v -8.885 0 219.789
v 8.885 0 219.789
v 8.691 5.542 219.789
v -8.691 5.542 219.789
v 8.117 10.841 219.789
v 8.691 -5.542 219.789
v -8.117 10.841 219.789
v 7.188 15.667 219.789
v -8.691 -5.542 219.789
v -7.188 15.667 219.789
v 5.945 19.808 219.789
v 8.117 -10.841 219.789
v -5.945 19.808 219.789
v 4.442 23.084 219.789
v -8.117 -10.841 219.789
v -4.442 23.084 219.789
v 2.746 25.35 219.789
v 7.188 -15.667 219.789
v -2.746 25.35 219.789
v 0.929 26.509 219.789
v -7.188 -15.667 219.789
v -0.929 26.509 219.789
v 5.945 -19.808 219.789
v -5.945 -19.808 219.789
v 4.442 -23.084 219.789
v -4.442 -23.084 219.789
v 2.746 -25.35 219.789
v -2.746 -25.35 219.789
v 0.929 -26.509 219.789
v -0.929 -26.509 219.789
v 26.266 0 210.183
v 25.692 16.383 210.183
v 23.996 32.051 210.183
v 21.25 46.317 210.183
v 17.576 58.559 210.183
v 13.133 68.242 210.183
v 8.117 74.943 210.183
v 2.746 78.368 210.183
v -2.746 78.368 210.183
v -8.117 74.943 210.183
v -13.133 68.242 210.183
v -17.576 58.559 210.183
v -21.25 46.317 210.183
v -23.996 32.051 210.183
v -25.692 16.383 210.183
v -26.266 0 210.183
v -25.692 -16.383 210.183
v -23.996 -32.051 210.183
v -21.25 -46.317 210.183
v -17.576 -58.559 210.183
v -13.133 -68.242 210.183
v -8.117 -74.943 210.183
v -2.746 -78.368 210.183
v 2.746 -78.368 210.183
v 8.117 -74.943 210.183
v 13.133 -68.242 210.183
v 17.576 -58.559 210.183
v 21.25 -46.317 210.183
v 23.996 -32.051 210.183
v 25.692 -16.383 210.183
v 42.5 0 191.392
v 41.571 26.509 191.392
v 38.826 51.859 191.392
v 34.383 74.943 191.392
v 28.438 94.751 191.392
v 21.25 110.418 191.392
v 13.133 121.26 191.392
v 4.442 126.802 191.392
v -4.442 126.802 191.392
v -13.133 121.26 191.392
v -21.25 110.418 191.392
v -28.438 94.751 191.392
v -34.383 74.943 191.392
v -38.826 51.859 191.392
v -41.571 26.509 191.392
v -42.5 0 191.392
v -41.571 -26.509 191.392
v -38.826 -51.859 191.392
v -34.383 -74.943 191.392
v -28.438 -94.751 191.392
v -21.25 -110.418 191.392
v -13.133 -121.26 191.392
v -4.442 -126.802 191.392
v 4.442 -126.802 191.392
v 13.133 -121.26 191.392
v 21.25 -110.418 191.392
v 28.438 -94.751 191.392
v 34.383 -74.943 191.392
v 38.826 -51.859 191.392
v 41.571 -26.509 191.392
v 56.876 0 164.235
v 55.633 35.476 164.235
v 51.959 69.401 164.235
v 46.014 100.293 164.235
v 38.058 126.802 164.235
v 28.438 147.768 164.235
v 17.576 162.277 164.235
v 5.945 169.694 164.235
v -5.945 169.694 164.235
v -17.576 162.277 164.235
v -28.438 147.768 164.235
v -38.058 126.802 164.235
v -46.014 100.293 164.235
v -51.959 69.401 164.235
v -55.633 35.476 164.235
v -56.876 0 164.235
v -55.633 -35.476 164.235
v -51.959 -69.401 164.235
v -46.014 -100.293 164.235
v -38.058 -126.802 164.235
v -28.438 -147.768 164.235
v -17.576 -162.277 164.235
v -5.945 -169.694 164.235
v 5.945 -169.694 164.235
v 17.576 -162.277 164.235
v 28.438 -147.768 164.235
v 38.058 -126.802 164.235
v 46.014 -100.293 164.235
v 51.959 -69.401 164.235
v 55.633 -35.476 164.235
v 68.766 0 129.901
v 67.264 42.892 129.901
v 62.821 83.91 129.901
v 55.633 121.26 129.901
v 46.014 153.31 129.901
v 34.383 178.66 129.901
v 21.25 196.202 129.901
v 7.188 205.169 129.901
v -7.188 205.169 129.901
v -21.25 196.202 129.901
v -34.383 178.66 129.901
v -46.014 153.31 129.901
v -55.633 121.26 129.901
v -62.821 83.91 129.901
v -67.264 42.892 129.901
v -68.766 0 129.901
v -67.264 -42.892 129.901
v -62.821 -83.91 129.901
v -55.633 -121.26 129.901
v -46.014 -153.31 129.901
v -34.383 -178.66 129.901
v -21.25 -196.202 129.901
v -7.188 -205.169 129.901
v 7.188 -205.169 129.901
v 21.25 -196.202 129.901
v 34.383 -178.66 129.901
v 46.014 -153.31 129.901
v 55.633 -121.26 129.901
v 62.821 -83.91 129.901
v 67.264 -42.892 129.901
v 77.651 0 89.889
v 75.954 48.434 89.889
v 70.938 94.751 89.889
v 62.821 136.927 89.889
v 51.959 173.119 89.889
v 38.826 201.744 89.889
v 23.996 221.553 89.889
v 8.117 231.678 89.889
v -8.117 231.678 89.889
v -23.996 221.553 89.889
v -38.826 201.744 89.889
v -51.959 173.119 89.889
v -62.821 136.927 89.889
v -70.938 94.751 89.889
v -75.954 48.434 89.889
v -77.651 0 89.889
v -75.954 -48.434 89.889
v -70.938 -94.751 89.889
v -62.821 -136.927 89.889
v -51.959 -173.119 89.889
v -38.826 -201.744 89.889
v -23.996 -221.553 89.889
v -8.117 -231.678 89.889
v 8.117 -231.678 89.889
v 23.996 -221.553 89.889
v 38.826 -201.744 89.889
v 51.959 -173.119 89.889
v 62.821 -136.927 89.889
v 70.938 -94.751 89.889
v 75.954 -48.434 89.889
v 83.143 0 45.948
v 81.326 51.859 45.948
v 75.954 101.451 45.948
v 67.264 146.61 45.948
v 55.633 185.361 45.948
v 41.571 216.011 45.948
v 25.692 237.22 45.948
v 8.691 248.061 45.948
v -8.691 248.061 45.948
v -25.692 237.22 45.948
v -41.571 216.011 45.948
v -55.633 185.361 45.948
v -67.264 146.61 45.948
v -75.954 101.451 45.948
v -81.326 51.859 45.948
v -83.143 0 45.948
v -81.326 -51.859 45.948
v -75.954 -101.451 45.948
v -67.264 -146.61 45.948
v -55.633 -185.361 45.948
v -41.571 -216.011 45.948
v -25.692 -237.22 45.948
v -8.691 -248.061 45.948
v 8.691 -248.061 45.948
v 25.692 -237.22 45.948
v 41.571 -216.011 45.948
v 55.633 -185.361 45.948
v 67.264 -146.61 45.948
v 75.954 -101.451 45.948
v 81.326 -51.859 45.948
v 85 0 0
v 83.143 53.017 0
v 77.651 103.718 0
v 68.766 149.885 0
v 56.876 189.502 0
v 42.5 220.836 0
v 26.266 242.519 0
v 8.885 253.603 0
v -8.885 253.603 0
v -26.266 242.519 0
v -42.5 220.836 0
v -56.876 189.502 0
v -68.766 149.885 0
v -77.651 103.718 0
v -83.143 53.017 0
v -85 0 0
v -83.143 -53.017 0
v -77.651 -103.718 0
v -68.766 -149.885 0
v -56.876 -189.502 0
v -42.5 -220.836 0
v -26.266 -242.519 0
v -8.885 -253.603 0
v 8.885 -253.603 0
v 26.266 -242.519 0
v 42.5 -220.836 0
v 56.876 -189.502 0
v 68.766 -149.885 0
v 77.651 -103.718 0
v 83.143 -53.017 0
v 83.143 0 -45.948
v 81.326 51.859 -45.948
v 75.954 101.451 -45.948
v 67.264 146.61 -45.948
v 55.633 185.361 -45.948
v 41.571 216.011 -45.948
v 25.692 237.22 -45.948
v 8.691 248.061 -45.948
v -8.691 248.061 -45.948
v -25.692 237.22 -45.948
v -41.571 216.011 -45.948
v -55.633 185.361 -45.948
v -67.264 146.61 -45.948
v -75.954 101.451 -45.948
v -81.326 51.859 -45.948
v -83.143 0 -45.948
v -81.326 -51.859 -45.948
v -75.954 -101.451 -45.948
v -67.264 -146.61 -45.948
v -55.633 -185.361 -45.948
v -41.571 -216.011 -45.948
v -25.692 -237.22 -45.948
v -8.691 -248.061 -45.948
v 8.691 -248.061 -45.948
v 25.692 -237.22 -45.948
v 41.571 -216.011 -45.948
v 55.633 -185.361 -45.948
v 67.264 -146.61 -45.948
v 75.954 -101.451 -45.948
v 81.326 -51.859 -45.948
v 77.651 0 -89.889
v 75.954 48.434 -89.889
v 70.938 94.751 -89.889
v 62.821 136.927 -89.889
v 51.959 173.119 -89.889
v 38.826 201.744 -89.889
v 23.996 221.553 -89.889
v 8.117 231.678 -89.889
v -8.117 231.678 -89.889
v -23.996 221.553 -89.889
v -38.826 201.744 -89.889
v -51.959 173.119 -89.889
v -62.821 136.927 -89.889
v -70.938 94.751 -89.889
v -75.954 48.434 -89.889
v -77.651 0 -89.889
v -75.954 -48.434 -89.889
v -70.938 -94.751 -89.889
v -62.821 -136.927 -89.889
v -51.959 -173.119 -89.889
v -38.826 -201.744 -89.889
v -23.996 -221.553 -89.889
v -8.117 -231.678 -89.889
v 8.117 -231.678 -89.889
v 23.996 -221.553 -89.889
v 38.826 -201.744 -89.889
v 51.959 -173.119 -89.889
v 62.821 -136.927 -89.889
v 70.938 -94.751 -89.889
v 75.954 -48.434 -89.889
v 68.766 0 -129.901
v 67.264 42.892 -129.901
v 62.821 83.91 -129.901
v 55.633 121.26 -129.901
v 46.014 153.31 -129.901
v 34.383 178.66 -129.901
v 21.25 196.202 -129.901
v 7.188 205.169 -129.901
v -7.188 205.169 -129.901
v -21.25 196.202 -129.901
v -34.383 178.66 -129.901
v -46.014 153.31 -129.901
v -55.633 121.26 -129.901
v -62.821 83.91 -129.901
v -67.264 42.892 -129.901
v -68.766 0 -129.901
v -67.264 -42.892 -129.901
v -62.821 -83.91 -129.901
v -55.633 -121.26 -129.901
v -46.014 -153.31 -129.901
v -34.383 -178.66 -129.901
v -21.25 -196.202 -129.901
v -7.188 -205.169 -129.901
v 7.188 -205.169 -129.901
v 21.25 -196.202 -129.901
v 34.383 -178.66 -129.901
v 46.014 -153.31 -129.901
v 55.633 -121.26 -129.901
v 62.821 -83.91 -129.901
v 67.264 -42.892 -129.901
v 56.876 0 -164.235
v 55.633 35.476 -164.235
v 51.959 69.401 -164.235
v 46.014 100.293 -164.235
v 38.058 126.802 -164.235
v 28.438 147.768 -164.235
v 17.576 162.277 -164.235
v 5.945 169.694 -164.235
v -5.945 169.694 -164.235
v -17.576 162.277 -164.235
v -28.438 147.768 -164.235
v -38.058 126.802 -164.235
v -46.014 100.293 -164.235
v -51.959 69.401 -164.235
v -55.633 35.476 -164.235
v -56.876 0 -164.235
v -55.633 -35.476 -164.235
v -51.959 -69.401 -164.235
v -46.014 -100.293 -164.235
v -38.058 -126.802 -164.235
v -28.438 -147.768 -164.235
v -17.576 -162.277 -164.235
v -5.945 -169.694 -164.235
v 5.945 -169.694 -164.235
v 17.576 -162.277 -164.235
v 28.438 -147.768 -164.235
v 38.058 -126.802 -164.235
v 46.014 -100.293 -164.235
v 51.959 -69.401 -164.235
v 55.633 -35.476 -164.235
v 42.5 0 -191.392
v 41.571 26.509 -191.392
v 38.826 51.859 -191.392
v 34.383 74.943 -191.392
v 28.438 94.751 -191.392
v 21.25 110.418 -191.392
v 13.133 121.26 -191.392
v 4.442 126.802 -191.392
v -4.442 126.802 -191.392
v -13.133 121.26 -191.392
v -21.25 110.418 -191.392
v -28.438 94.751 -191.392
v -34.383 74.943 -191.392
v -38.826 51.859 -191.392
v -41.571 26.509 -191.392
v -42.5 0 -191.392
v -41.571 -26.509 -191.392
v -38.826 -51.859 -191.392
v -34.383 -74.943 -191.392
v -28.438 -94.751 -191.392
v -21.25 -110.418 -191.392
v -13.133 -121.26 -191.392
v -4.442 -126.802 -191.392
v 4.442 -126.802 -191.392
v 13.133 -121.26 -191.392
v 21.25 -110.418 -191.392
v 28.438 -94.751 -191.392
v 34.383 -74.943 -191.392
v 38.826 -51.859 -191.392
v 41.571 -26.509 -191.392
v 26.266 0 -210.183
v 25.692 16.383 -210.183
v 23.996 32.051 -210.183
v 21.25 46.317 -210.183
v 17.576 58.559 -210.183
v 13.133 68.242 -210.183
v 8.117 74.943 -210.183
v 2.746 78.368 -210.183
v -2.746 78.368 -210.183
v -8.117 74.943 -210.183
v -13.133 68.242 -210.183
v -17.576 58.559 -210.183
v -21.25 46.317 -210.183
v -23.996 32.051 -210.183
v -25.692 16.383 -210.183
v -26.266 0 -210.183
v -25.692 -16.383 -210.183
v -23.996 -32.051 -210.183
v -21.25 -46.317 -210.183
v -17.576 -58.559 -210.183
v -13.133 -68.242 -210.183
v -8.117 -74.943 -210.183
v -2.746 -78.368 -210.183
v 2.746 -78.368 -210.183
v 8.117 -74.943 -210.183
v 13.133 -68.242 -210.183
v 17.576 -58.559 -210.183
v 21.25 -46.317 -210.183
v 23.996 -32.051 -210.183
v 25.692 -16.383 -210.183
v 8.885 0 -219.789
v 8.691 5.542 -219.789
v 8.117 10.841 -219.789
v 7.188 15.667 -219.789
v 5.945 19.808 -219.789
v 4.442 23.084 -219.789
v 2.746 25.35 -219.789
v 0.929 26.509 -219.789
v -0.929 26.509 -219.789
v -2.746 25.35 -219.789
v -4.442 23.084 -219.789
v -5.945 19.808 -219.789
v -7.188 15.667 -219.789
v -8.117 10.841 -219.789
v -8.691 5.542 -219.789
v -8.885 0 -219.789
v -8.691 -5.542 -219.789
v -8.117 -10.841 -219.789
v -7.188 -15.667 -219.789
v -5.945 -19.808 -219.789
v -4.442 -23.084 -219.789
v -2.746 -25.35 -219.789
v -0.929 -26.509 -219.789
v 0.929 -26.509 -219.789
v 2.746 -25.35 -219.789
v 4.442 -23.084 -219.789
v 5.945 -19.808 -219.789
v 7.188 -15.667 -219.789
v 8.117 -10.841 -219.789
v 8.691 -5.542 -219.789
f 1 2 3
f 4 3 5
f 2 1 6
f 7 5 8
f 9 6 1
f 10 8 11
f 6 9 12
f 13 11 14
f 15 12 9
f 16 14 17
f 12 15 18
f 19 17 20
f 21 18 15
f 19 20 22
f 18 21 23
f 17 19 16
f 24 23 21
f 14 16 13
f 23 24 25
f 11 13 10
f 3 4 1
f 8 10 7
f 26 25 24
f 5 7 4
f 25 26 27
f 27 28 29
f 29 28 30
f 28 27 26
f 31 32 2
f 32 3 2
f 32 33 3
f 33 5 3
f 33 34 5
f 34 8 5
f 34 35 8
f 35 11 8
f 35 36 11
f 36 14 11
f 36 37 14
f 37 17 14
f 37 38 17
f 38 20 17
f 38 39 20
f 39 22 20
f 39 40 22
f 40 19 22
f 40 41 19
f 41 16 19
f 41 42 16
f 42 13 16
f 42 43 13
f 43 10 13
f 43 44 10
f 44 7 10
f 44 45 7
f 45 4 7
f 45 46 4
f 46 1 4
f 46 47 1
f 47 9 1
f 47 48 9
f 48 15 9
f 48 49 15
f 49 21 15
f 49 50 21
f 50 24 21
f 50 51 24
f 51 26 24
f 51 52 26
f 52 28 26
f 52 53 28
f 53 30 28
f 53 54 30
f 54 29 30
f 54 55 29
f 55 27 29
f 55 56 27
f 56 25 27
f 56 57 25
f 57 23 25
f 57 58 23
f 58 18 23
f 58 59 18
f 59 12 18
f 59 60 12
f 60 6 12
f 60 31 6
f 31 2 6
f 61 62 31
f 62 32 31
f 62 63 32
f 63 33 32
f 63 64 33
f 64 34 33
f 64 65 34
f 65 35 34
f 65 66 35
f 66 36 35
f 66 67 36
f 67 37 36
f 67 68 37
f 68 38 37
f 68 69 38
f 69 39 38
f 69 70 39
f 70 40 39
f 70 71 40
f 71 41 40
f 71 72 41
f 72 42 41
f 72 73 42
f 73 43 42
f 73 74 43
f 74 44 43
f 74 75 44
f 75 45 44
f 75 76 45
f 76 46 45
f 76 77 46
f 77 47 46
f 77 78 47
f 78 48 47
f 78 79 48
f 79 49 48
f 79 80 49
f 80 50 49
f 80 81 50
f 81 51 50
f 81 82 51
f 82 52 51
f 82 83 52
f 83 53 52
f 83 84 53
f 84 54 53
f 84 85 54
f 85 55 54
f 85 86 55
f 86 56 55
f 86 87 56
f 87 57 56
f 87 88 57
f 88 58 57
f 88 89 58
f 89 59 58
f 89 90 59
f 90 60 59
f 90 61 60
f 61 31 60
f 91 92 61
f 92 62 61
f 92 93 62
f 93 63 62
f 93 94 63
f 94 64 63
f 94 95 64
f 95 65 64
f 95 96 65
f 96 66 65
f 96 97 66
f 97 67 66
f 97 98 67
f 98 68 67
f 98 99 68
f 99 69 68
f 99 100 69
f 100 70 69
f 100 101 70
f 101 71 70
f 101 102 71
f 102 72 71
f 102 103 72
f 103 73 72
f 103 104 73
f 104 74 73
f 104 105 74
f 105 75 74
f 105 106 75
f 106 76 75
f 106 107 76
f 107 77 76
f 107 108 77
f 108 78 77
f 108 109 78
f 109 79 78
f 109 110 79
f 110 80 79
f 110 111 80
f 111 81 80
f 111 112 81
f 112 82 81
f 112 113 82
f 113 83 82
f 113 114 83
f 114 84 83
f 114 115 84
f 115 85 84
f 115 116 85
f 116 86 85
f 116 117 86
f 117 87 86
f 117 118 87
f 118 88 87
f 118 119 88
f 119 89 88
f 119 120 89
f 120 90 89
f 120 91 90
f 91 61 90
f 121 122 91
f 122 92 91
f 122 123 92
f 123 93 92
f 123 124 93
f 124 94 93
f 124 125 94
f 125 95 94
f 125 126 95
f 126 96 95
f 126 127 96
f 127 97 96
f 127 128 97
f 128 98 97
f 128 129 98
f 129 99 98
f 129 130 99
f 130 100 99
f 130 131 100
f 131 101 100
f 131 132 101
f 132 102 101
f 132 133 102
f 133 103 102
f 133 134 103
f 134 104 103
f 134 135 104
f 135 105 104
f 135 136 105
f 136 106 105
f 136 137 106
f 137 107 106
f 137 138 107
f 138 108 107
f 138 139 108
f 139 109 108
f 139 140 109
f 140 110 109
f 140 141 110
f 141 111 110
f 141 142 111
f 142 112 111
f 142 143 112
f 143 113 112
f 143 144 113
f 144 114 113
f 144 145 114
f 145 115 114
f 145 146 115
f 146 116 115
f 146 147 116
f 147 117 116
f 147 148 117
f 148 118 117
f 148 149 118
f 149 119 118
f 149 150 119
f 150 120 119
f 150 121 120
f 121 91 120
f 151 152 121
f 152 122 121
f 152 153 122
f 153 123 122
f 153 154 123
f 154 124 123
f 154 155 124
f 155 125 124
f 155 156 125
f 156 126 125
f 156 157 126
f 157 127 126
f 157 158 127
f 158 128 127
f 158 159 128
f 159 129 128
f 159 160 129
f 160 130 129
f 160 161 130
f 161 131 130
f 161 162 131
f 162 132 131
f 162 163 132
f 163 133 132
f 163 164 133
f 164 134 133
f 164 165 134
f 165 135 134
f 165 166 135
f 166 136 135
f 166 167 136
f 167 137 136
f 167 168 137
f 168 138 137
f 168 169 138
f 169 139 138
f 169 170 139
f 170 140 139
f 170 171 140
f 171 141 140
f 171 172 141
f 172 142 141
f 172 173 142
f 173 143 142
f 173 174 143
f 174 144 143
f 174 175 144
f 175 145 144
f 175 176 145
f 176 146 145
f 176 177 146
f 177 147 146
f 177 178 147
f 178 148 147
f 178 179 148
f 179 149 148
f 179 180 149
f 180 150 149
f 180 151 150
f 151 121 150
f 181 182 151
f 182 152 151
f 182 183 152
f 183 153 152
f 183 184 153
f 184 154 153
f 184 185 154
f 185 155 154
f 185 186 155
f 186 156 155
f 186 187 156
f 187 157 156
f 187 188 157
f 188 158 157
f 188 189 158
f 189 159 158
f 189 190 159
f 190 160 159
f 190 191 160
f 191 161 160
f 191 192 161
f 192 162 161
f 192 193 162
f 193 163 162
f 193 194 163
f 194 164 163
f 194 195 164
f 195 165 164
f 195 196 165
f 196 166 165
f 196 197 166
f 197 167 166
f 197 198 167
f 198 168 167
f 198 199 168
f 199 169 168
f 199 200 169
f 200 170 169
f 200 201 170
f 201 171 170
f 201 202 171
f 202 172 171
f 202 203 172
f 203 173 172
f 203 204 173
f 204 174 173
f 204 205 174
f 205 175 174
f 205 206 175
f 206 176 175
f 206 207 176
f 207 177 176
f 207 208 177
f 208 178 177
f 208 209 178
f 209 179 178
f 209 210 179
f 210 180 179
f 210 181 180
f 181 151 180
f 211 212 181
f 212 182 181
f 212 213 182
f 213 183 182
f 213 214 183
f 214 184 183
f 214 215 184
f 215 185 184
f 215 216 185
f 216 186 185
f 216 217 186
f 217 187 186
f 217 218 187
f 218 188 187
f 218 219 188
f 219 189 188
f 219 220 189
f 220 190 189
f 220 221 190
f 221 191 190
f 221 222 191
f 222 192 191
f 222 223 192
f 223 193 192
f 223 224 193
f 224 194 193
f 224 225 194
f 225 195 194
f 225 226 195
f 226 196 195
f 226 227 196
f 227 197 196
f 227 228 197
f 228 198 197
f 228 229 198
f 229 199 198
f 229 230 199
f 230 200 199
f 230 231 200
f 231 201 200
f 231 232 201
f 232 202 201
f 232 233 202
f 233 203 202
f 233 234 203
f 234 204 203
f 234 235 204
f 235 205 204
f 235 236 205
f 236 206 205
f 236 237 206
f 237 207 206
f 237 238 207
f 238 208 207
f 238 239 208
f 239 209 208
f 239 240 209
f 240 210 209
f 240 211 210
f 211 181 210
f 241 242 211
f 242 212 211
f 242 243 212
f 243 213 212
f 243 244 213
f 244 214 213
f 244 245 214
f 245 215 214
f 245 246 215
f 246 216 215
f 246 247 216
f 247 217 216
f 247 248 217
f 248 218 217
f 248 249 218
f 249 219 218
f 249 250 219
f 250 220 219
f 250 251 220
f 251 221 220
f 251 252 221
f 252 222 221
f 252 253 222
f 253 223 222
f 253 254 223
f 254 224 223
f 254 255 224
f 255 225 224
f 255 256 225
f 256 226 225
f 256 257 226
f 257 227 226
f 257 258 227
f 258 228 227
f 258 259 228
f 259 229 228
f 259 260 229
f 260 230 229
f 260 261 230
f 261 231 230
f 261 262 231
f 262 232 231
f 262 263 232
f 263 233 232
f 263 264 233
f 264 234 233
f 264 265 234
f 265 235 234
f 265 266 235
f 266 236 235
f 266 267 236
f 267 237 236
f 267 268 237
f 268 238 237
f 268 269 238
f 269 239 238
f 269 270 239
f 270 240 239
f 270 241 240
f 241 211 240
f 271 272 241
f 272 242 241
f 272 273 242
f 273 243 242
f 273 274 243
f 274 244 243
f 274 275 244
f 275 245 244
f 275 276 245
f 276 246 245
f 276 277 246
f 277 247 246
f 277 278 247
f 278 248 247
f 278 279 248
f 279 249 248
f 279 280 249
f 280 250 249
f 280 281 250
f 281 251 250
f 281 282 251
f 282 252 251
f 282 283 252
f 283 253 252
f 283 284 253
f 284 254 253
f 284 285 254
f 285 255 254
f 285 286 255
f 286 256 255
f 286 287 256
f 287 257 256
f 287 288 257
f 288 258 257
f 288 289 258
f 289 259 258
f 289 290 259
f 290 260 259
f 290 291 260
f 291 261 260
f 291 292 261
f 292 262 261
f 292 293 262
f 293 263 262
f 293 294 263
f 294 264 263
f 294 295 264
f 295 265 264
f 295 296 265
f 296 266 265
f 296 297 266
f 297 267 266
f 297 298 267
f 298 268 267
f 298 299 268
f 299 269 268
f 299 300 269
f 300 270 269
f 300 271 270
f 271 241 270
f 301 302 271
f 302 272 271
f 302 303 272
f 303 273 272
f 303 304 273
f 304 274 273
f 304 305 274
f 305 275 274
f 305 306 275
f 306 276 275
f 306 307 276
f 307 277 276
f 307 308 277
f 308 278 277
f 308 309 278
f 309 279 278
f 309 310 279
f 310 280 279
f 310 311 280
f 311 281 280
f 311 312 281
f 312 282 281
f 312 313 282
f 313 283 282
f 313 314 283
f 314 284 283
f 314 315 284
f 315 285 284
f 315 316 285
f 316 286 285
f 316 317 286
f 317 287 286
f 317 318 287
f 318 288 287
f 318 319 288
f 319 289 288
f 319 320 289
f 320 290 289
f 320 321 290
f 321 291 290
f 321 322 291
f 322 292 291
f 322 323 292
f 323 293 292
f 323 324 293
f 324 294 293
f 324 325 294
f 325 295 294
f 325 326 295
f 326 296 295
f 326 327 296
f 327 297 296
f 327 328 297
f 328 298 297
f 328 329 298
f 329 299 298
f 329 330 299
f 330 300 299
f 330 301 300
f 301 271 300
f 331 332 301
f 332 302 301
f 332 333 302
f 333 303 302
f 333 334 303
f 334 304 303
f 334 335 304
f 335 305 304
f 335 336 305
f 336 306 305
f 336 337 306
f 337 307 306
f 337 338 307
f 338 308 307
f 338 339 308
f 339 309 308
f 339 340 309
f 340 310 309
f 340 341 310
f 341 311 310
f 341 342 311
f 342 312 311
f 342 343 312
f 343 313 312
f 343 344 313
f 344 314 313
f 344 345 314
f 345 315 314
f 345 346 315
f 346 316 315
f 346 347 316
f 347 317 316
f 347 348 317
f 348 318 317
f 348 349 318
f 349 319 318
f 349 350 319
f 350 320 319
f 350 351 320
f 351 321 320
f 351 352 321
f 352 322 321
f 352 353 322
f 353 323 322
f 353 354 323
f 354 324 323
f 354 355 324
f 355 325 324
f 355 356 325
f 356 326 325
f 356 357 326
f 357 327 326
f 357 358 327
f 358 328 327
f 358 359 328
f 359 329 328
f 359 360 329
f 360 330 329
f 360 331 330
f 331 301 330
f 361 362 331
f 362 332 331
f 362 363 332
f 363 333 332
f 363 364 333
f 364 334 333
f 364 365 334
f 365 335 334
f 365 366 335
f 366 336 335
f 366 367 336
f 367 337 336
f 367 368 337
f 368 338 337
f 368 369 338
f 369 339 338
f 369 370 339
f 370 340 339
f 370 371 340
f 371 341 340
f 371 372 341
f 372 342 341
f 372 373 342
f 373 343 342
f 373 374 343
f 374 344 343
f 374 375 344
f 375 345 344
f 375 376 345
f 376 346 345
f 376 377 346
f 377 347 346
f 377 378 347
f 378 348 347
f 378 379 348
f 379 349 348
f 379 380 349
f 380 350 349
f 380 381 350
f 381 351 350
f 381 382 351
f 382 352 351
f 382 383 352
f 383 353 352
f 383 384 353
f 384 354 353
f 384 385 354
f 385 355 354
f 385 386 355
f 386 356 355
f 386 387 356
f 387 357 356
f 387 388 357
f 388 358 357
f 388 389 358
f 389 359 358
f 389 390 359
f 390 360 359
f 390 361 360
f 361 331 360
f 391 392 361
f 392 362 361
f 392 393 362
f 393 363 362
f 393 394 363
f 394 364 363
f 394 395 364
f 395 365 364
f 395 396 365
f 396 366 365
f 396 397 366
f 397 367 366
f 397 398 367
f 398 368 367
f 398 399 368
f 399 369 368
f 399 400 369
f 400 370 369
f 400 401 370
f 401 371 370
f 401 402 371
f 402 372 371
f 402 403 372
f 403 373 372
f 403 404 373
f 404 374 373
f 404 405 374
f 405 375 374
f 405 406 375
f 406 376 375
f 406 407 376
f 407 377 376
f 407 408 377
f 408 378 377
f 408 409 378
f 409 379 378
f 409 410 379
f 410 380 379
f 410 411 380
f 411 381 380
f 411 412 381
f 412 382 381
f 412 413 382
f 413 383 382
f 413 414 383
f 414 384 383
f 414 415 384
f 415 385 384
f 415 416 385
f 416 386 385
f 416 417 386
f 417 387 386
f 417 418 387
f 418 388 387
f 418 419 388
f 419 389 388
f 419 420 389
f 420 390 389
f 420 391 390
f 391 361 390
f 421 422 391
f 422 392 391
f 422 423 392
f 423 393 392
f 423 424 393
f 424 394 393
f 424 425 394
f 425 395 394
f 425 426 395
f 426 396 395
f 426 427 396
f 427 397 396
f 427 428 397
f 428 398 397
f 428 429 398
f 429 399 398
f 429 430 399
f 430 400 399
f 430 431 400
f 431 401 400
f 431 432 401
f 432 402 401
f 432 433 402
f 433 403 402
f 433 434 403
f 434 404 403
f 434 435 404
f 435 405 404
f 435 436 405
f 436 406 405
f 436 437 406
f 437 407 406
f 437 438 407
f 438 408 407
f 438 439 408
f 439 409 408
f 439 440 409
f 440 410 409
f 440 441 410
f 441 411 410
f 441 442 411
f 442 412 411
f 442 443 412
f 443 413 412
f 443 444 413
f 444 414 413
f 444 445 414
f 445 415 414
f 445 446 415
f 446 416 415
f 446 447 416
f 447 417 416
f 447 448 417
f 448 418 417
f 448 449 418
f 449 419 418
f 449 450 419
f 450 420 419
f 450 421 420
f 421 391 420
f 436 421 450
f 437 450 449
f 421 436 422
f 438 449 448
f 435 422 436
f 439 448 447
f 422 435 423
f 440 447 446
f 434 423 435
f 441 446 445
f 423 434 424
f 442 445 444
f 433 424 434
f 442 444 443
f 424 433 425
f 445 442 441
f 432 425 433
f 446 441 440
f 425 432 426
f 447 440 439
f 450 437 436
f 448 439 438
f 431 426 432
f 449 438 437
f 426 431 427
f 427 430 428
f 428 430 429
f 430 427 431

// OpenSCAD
// Generated by SolidPython 1.0.1 on 2020-07-29 00:46:46


scale(v = [5, 15, 13]) {
	sphere(r = 17);
}
/***********************************************
*********      SolidPython code:      **********
************************************************
 
# import packages: SolidPython
from solid import *
from solid.utils import *
from itertools import chain, combinations, permutations


class Resize:

    def __init__(self, scad_file):
        self.scad_file = scad_file
        #self.scad_file = import_scad(scad_file)
        # cone/cylinder param:
        self.r1 = 0
        self.r2 = 0
        self.h = 0
        # rectangular prism param:
        self.w = 0
        self.l = 0
        # ellipse param:
        self.r = 0

    # import OpenScad code (file name corresponds to shape)


    # classify shape + parameters
    def assign(self, param1, param2, param3):
        if self.scad_file == 'cone.scad':
            self.r1 = param1
            self.r2 = param2
            self.h = param3
        elif self.scad_file == 'cylinder.scad':
            self.r1 = param1
            self.r2 = param2
            self.h = param3
        elif self.scad_file == 'rectangularPrism.scad':
            self.h = param1
            self.l = param2
            self.w = param3
        else:
            self.r = param1
            self.h = param2

    # resize parameters
    def iterate(self):
        x = range(3, 20, 2)
        i = 1
        if self.scad_file == 'cone.scad':
            tempList = list(permutations(x, 2))
            for temp in tempList:
                param1 = temp[0]
                param2 = temp[1]
                filepath = 'produced_scad_files/' + 'cone' + str(param1) + '_' + str(param2) + '_' + '.scad'
                scad_render_to_file(cylinder(h=param1, r1=param2, r2=0), filepath)

        elif self.scad_file == 'cylinder.scad':
            tempList = list(permutations(x, 3))
            for temp in tempList:
                param1 = temp[0]
                param2 = temp[1]
                filepath = 'produced_scad_files/' + 'cylinder' + str(param1) + '_' + str(param2) + '_' + '.scad'
                scad_render_to_file(cylinder(h=param1, r1=param2, r2=param2), filepath)

        elif self.scad_file == 'rectangularPrism.scad':
            tempList = list(permutations(x, 3))
            for temp in tempList:
                param1 = temp[0]
                param2 = temp[1]
                param3 = temp[2]
                filepath = 'produced_scad_files/' + 'rectangularPrism' + str(param1) + '_' + str(param2) + '_' + str(
                    param3) + '.scad'
                scad_render_to_file(cube(size=(param1, param2, param3)), filepath)

        elif self.scad_file == 'ellipse.scad':
            tempList = list(permutations(x, 4))
            for temp in tempList:
                param1 = temp[0]
                param2 = temp[1]
                param3 = temp[2]
                param4 = temp[3]
                filepath = 'produced_scad_files/' + 'ellipse' + str(param1) + '_' + str(param2) + '_' + str(param3) + '_' + str(param4) + '.scad'
                scad_render_to_file(scale([param1, param2, param3])(sphere(r=param4)), filepath)

    def render_to_scadfile(self):
        scad_render_to_file(scad, 'example.scad') 
 
************************************************/
